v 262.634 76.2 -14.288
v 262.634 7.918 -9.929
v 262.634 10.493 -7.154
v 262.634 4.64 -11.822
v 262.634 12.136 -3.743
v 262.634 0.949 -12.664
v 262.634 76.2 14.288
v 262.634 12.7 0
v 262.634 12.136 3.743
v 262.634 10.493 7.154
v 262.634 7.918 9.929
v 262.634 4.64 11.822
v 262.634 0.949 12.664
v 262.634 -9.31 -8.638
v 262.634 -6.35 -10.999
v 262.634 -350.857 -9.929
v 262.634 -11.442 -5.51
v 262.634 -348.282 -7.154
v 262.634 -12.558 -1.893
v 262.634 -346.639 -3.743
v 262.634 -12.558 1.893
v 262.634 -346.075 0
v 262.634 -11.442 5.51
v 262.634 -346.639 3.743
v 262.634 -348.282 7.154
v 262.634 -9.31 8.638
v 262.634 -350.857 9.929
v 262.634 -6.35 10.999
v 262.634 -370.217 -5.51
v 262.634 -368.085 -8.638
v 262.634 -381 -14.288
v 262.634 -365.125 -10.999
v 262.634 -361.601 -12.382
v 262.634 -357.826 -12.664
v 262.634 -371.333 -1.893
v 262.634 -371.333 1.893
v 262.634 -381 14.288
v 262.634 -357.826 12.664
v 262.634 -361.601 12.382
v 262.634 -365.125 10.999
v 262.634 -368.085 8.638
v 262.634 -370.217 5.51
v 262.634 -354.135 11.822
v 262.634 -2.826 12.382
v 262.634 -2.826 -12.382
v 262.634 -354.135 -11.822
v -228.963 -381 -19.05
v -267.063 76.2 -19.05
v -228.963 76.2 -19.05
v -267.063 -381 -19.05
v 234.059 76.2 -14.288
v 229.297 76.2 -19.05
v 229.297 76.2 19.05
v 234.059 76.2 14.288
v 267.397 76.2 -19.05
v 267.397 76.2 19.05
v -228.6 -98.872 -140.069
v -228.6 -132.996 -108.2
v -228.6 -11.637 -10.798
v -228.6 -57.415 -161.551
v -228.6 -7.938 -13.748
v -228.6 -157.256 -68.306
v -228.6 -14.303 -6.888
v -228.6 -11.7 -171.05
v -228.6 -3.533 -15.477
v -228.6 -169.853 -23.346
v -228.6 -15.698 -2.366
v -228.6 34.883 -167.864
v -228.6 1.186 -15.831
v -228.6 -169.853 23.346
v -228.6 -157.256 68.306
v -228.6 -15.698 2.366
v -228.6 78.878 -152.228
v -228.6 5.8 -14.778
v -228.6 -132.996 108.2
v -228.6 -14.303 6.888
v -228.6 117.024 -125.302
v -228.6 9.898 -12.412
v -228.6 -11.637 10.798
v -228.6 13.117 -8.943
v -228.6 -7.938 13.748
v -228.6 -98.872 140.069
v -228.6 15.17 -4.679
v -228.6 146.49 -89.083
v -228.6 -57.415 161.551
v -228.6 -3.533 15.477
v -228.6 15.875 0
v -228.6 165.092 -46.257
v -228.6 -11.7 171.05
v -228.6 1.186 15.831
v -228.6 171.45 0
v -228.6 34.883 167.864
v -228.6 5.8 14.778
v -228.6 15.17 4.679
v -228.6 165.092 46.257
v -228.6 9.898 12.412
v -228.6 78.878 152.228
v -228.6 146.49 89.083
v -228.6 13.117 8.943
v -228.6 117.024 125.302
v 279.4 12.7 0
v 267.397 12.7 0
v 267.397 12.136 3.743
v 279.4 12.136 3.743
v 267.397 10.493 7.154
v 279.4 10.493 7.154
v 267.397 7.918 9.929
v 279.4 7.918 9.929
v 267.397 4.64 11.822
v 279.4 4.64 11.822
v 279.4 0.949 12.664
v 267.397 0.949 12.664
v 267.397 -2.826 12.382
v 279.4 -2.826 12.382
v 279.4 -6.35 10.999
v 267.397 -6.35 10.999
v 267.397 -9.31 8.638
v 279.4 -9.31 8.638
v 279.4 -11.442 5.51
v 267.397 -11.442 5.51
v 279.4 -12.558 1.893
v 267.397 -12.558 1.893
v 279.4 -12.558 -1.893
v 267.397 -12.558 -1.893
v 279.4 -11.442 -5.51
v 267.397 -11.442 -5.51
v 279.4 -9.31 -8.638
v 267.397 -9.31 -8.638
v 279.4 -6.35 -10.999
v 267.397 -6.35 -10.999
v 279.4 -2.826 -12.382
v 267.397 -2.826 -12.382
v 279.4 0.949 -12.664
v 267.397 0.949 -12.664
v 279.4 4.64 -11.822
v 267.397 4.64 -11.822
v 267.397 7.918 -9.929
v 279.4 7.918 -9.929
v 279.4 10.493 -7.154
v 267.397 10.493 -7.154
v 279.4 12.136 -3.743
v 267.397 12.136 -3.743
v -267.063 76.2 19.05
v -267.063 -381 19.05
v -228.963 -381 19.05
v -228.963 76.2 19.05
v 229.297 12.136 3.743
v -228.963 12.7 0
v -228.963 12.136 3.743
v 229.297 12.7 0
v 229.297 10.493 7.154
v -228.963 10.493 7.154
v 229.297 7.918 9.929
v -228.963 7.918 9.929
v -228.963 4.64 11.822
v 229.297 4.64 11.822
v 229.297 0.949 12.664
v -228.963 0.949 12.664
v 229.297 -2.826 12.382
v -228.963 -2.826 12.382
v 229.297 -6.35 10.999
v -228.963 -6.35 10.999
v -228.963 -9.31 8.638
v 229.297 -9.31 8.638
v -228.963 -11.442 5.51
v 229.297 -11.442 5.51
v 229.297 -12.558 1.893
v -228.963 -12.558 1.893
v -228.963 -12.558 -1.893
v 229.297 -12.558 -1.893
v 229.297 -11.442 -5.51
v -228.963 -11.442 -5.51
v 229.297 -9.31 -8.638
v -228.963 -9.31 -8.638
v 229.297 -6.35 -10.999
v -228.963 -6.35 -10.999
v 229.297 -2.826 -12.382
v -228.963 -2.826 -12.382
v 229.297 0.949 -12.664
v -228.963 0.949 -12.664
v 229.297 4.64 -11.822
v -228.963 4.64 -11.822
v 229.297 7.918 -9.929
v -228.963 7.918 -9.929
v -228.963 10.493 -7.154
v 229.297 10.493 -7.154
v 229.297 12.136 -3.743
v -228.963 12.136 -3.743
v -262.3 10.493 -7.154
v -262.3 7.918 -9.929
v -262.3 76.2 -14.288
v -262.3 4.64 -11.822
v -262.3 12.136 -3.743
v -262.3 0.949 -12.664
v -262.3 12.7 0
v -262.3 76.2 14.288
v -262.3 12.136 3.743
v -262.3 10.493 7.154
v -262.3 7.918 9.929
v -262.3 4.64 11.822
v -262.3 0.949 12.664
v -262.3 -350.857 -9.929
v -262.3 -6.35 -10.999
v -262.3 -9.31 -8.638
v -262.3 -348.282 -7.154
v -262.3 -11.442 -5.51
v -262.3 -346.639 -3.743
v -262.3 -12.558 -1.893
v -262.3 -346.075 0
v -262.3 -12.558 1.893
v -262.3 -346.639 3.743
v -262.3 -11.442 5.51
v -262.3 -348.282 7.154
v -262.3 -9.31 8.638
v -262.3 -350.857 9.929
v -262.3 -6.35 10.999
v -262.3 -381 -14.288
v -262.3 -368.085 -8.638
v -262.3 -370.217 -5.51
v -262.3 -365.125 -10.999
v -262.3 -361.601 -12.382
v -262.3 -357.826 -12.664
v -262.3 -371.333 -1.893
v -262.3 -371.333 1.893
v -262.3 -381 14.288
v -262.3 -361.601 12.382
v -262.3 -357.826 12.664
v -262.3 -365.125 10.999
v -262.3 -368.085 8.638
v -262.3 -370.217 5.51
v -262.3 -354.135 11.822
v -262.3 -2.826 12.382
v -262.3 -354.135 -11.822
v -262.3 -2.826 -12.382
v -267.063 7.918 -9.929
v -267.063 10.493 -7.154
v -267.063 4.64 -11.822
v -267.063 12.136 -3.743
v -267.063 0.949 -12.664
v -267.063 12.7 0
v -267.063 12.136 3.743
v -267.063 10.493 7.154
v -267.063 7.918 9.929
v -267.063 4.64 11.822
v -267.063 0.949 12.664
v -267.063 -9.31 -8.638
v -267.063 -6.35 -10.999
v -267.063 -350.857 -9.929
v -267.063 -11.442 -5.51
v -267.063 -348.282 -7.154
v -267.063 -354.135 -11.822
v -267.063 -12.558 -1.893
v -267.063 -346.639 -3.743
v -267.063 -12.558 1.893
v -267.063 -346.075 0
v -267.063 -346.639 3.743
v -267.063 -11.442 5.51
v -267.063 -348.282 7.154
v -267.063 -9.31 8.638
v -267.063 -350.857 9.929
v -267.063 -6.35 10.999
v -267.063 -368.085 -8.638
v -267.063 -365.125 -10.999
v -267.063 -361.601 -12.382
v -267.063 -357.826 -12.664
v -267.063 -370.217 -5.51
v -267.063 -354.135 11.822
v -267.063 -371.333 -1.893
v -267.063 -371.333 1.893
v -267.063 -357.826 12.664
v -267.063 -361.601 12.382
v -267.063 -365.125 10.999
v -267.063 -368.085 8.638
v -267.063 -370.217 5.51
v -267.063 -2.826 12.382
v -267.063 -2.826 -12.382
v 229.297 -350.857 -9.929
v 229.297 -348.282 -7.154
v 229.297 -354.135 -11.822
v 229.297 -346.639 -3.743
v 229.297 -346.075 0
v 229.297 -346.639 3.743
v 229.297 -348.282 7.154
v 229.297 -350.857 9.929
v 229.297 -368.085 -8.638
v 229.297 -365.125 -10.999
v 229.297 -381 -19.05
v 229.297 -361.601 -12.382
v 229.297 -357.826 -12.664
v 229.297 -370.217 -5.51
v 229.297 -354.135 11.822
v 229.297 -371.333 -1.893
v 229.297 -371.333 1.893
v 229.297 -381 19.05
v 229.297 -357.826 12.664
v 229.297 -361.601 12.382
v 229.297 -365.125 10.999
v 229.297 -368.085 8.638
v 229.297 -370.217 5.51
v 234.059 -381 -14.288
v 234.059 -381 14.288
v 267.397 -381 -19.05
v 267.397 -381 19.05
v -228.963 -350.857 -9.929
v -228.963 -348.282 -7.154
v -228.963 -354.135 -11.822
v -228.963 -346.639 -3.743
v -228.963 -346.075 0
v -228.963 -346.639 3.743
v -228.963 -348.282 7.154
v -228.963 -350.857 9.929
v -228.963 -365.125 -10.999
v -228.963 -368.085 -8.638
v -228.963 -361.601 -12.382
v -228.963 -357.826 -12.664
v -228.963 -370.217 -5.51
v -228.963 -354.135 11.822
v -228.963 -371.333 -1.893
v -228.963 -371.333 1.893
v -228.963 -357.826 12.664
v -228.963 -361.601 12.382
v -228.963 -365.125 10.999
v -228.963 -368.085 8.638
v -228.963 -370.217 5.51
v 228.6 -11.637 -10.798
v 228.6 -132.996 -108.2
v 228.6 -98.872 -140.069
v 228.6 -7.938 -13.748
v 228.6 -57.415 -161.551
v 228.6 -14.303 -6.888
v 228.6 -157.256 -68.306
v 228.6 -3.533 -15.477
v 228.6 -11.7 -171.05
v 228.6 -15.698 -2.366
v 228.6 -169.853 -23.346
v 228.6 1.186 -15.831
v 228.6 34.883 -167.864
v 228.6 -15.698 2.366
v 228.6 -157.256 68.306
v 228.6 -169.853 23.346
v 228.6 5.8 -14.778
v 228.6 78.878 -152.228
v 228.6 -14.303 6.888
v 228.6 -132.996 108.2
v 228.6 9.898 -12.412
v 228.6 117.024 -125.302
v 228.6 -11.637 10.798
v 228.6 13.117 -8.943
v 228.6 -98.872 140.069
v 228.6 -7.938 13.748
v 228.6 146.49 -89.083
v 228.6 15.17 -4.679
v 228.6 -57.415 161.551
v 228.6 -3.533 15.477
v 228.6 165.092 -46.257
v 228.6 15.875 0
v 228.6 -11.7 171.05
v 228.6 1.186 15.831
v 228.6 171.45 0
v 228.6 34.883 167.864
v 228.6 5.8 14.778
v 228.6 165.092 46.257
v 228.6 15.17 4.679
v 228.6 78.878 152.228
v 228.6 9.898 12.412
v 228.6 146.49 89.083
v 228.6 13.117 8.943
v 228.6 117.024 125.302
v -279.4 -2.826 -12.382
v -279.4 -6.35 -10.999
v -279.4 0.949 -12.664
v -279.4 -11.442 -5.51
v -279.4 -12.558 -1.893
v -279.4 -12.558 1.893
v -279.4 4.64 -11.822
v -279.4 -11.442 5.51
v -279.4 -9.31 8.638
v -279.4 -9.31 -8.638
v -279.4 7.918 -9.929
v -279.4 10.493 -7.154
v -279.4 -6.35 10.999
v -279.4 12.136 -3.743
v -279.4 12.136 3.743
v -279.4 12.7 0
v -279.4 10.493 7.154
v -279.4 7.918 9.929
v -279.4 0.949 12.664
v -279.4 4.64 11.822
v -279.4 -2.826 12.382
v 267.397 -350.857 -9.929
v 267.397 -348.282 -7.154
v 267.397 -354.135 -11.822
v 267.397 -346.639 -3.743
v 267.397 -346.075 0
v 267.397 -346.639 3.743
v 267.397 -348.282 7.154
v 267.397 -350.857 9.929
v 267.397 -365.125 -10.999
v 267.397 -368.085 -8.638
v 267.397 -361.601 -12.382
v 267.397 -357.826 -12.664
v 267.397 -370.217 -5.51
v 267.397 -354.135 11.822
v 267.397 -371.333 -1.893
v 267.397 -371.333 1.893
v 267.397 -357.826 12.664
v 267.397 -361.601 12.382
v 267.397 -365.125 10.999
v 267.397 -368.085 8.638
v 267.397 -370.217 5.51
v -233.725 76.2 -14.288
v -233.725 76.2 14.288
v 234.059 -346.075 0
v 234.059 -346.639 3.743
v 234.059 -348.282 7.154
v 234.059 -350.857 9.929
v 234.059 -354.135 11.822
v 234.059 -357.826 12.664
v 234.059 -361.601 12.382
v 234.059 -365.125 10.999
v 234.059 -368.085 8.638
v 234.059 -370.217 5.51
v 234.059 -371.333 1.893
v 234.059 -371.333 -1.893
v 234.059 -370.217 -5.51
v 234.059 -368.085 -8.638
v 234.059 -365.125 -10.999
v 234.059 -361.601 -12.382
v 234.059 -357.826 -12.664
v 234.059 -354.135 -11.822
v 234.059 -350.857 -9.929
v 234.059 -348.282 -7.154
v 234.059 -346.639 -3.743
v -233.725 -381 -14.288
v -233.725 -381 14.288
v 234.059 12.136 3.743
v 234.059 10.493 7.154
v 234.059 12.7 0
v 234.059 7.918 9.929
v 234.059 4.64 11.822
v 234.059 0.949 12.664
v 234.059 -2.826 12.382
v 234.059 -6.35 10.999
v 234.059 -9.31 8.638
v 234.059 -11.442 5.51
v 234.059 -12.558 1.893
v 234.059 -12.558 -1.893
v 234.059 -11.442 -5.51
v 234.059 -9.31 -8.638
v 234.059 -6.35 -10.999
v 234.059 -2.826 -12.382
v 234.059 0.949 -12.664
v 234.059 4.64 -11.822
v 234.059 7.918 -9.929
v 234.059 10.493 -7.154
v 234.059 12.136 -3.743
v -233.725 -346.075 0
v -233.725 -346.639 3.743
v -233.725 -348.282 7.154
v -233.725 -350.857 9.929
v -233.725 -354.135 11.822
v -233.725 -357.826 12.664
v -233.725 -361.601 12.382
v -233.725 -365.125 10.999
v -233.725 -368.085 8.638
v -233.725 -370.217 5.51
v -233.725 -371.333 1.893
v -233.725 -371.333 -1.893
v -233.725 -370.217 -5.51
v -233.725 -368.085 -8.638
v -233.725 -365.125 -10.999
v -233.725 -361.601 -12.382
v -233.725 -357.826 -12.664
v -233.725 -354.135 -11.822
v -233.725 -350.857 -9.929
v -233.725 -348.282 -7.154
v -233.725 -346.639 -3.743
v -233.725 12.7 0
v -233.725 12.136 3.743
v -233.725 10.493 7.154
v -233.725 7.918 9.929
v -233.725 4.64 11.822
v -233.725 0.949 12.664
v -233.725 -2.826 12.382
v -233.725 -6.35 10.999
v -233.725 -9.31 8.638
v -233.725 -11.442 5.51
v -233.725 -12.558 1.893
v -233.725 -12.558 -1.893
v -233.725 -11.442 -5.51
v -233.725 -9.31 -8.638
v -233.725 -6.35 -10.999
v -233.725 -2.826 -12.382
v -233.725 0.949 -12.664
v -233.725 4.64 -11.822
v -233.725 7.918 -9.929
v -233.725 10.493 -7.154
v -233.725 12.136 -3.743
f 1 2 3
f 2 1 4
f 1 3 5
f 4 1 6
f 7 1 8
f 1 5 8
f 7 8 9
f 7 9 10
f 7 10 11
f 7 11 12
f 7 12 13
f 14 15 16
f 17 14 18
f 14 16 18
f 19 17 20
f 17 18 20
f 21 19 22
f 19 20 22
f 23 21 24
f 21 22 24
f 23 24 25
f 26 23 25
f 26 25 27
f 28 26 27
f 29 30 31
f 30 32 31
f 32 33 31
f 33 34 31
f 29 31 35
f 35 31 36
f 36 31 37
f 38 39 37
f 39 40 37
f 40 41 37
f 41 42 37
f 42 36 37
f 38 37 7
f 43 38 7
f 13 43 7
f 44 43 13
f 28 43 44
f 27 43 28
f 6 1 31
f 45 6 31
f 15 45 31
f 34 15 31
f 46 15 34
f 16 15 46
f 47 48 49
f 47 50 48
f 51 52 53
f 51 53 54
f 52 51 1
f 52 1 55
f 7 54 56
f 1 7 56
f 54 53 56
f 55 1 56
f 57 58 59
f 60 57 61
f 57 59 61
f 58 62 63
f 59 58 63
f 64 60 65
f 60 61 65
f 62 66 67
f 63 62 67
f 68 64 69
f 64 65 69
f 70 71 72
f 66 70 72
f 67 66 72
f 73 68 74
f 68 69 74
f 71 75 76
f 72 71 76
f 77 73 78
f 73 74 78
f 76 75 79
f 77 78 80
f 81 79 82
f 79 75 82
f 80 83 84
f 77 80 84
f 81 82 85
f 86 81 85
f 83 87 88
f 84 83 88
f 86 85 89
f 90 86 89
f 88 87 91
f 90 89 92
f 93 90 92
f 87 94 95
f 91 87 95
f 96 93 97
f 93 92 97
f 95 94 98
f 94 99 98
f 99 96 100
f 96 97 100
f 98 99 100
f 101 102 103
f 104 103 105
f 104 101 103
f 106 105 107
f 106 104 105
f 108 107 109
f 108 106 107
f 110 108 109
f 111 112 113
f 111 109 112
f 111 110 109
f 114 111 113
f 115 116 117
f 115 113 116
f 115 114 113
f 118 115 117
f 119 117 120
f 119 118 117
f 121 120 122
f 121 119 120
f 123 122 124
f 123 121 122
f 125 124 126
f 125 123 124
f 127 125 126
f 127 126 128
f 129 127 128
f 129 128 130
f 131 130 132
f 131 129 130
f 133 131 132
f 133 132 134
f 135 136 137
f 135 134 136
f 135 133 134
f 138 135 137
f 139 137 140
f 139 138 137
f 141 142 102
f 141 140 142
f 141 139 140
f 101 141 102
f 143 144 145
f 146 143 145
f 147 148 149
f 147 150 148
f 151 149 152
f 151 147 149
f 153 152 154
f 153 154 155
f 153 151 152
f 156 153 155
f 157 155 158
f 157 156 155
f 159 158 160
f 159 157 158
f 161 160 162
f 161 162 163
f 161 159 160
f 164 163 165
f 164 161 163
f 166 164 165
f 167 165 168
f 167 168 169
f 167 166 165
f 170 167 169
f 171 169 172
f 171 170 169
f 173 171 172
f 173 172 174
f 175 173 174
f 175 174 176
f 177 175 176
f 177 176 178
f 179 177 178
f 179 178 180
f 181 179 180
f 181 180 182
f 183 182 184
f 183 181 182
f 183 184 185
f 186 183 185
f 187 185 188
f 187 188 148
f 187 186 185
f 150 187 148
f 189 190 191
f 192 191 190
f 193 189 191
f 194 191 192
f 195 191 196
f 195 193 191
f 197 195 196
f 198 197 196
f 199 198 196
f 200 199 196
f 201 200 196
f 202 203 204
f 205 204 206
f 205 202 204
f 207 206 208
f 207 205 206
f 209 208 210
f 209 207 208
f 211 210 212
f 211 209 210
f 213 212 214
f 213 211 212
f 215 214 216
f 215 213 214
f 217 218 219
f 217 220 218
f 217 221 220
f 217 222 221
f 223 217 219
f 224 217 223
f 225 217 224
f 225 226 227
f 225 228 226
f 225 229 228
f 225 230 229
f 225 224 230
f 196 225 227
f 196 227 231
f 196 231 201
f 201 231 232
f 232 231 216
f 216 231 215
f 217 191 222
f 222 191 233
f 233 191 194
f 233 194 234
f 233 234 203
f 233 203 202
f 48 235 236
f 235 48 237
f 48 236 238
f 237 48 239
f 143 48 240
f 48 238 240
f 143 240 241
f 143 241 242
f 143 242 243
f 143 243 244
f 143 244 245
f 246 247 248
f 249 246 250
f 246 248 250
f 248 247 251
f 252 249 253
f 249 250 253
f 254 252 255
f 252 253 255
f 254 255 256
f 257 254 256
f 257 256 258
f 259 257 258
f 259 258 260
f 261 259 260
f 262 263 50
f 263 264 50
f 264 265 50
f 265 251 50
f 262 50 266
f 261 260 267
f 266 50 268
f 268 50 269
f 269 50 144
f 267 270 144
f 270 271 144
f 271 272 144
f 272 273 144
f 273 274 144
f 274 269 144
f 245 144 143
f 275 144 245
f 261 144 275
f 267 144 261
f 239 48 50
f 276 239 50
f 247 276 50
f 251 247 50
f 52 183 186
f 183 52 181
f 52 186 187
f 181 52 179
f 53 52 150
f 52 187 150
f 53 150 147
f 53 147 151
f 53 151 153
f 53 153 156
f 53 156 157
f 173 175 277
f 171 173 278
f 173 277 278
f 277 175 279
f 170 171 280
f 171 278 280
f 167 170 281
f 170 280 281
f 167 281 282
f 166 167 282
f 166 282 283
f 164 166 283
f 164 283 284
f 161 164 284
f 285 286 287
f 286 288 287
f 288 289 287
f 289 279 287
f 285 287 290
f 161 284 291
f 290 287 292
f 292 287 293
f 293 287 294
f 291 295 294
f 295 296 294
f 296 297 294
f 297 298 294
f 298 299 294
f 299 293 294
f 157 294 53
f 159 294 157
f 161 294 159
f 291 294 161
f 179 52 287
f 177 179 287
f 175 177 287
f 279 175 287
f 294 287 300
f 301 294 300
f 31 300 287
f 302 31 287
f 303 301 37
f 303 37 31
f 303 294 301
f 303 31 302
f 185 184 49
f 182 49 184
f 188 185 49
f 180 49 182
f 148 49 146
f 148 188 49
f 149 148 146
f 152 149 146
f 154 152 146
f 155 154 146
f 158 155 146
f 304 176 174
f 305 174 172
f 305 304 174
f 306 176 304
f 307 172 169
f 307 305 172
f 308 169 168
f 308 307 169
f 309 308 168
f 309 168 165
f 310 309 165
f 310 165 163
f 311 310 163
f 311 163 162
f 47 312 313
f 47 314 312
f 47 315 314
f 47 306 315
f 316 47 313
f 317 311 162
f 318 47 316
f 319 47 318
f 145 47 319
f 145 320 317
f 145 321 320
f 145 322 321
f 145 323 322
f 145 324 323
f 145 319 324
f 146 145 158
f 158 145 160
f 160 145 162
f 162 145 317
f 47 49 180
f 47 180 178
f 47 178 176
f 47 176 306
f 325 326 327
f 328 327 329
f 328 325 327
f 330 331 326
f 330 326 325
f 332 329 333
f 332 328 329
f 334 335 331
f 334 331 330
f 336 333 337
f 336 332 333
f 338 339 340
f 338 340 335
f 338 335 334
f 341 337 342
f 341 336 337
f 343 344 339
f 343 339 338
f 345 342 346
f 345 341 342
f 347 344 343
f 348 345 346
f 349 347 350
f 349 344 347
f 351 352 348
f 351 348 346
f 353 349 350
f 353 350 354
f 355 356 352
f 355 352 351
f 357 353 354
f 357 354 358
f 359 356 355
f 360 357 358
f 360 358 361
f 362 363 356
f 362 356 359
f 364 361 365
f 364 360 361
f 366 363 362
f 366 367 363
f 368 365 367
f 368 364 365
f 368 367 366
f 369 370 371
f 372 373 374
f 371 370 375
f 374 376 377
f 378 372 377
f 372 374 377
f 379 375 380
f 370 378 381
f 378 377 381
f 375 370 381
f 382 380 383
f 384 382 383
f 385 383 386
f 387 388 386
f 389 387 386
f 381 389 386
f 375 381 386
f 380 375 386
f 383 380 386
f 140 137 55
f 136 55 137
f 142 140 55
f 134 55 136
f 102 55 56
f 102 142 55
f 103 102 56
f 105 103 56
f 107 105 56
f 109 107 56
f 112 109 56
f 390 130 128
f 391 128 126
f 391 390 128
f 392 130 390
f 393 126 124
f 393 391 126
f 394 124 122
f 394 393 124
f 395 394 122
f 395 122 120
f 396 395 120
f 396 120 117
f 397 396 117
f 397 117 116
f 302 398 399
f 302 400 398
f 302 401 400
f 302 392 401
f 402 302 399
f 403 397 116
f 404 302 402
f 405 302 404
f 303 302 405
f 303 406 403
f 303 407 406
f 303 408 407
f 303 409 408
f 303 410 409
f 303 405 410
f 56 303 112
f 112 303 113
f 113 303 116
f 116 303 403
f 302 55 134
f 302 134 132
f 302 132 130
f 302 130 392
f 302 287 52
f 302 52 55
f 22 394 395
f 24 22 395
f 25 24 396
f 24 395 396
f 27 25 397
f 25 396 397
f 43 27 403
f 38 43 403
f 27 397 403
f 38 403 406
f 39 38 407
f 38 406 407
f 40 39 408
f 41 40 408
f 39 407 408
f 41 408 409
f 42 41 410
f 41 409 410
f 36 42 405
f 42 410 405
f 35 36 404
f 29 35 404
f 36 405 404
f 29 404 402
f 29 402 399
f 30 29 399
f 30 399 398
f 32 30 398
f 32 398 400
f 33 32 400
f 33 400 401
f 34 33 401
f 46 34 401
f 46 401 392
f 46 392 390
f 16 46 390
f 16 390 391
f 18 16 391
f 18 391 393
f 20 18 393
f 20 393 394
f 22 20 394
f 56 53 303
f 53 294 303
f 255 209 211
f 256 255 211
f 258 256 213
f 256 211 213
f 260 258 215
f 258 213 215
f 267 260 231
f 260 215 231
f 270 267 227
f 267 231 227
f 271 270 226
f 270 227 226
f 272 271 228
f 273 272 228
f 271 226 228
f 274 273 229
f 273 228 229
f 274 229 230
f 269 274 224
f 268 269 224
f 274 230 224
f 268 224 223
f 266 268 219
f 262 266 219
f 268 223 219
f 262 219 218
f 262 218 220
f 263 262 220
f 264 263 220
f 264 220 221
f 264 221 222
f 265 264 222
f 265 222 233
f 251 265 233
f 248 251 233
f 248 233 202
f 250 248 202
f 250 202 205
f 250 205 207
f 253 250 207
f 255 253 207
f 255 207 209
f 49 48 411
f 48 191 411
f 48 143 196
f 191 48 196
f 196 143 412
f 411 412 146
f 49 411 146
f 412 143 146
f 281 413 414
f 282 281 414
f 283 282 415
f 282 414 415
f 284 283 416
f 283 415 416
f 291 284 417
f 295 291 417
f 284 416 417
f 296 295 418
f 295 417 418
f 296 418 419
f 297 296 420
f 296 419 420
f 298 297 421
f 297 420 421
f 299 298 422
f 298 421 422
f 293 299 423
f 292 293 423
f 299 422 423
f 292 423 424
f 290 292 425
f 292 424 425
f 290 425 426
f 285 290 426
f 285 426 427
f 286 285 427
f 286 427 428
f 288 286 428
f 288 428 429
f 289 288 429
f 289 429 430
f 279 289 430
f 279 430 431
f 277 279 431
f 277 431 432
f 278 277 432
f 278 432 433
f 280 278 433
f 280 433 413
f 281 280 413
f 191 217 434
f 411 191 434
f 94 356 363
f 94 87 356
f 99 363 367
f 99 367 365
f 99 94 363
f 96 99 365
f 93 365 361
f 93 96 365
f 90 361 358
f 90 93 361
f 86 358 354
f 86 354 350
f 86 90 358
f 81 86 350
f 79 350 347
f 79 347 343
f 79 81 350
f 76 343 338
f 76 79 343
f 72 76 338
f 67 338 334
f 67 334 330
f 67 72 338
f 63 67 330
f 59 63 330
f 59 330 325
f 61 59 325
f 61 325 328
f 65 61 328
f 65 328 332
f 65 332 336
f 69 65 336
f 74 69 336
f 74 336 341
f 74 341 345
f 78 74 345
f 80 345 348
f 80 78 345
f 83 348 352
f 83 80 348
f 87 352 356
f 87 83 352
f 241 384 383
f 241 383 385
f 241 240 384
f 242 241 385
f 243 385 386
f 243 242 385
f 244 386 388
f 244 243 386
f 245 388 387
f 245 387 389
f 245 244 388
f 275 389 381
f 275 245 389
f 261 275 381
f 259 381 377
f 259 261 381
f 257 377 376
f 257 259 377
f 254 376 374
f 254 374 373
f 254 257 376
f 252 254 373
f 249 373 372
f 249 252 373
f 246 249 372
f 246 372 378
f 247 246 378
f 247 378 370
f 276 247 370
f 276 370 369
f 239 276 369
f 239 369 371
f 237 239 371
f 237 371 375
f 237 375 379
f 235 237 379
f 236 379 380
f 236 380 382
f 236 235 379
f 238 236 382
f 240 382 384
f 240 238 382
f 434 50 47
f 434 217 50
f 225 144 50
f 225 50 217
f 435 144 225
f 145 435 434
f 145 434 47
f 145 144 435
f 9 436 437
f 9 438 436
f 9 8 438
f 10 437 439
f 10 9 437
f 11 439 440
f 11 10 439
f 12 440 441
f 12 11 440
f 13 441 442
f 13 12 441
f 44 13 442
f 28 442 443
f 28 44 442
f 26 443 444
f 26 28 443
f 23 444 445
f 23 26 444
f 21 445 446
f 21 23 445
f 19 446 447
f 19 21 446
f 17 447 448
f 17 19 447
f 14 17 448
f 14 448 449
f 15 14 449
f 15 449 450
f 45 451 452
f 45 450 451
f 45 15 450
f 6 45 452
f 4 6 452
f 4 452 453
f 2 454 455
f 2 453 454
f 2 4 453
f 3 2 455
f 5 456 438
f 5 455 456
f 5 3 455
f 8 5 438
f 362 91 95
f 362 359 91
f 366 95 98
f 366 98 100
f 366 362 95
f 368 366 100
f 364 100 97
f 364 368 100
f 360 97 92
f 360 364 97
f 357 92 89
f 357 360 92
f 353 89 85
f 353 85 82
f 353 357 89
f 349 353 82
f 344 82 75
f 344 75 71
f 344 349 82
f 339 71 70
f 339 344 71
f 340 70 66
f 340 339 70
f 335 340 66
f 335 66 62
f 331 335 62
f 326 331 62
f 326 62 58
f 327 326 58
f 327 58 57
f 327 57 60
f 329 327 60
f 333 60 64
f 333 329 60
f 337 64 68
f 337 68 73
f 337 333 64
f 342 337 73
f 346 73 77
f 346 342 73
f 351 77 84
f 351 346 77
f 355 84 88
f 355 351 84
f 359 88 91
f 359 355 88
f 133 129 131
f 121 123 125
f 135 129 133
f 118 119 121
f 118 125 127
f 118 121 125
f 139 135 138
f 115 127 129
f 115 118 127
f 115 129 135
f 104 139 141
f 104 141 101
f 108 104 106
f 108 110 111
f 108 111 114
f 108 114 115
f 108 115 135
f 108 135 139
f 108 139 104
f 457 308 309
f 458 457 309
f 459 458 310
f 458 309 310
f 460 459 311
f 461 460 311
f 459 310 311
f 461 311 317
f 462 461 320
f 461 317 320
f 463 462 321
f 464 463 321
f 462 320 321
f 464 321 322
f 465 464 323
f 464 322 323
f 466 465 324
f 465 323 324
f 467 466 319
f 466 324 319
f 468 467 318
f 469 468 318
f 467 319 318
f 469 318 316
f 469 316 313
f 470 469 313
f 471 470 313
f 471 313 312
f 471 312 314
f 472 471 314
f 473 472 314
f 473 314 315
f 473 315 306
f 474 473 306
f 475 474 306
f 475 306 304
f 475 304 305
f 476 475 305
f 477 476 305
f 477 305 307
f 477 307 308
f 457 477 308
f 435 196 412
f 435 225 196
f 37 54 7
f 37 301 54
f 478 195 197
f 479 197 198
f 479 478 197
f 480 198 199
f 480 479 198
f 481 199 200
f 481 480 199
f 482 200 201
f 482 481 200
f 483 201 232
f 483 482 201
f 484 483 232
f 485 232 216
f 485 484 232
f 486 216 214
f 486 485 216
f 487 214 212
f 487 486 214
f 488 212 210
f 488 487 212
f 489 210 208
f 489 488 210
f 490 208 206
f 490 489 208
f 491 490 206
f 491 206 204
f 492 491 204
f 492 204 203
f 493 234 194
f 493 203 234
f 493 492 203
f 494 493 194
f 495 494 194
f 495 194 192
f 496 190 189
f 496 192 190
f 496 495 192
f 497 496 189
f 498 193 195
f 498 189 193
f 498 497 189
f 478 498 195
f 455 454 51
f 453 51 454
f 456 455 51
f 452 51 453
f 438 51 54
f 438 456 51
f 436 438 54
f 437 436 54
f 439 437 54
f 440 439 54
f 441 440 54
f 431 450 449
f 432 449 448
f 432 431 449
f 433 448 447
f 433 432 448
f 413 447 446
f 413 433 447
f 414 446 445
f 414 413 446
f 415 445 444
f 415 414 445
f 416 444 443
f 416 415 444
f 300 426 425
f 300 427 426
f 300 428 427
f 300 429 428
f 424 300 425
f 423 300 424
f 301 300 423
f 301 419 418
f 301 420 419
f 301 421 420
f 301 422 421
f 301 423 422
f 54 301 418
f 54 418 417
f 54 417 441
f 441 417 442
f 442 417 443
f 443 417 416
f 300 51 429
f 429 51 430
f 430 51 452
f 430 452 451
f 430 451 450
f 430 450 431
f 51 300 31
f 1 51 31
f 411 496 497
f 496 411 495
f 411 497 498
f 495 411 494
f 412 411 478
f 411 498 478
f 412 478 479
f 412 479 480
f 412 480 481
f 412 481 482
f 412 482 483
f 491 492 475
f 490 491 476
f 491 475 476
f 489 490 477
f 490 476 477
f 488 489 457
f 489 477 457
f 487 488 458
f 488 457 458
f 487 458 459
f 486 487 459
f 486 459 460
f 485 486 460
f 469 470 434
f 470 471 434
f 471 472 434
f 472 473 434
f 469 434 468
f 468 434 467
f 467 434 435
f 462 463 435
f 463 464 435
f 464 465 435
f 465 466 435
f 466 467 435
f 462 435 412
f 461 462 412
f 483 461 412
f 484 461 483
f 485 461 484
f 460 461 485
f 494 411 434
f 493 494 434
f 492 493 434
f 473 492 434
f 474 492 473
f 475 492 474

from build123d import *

# Parameters (mm, degrees)
F0_R          = 171.45
F0_R_2        = 15.875
F1_DEPTH      = 228.6
F2_R          = 12.7
F3_DEPTH      = 279.4
F4_W          = 38.1
F4_H          = 38.1
F4_W_2        = 28.575
F4_H_2        = 28.575
F5_DEPTH      = 381
F5_DEPTH_BACK = 76.2
F6_R          = 12.7
F7_DEPTH      = 546.7976089102


with BuildPart() as f1:
    # F0 (on Right) → F1 (new body, symmetric)
    with BuildSketch(Plane.YZ):
        Circle(F0_R)
        Circle(F0_R_2, mode=Mode.SUBTRACT)
    extrude(amount=F1_DEPTH, both=True)


with BuildPart() as f3:
    # F2 (on Right) → F3 (new body, symmetric)
    with BuildSketch(Plane.YZ):
        Circle(F2_R)
    extrude(amount=F3_DEPTH, both=True)

    # F4 (on Front) → F5 (join, two sides)
    with BuildSketch(Plane.XZ) as f5_sk:
        with Locations((248.3466089102, 0)):
            Rectangle(F4_W, F4_H)
        with Locations((248.3466089102, 0)):
            Rectangle(F4_W_2, F4_H_2, mode=Mode.SUBTRACT)
        with Locations((-248.012687972, 0)):
            Rectangle(F4_W, F4_H)
        with Locations((-248.012687972, 0)):
            Rectangle(F4_W_2, F4_H_2, mode=Mode.SUBTRACT)
    extrude(amount=F5_DEPTH)
    extrude(f5_sk.sketch, amount=-F5_DEPTH_BACK)

    # F6 (on face) → F7 (cut, through all)
    with BuildSketch(Plane.YZ.offset(267.3966089102)):
        with Locations((-358.775, 0)):
            Circle(F6_R)
    extrude(amount=-F7_DEPTH, mode=Mode.SUBTRACT)


solid = Compound([f1.part, f3.part])
